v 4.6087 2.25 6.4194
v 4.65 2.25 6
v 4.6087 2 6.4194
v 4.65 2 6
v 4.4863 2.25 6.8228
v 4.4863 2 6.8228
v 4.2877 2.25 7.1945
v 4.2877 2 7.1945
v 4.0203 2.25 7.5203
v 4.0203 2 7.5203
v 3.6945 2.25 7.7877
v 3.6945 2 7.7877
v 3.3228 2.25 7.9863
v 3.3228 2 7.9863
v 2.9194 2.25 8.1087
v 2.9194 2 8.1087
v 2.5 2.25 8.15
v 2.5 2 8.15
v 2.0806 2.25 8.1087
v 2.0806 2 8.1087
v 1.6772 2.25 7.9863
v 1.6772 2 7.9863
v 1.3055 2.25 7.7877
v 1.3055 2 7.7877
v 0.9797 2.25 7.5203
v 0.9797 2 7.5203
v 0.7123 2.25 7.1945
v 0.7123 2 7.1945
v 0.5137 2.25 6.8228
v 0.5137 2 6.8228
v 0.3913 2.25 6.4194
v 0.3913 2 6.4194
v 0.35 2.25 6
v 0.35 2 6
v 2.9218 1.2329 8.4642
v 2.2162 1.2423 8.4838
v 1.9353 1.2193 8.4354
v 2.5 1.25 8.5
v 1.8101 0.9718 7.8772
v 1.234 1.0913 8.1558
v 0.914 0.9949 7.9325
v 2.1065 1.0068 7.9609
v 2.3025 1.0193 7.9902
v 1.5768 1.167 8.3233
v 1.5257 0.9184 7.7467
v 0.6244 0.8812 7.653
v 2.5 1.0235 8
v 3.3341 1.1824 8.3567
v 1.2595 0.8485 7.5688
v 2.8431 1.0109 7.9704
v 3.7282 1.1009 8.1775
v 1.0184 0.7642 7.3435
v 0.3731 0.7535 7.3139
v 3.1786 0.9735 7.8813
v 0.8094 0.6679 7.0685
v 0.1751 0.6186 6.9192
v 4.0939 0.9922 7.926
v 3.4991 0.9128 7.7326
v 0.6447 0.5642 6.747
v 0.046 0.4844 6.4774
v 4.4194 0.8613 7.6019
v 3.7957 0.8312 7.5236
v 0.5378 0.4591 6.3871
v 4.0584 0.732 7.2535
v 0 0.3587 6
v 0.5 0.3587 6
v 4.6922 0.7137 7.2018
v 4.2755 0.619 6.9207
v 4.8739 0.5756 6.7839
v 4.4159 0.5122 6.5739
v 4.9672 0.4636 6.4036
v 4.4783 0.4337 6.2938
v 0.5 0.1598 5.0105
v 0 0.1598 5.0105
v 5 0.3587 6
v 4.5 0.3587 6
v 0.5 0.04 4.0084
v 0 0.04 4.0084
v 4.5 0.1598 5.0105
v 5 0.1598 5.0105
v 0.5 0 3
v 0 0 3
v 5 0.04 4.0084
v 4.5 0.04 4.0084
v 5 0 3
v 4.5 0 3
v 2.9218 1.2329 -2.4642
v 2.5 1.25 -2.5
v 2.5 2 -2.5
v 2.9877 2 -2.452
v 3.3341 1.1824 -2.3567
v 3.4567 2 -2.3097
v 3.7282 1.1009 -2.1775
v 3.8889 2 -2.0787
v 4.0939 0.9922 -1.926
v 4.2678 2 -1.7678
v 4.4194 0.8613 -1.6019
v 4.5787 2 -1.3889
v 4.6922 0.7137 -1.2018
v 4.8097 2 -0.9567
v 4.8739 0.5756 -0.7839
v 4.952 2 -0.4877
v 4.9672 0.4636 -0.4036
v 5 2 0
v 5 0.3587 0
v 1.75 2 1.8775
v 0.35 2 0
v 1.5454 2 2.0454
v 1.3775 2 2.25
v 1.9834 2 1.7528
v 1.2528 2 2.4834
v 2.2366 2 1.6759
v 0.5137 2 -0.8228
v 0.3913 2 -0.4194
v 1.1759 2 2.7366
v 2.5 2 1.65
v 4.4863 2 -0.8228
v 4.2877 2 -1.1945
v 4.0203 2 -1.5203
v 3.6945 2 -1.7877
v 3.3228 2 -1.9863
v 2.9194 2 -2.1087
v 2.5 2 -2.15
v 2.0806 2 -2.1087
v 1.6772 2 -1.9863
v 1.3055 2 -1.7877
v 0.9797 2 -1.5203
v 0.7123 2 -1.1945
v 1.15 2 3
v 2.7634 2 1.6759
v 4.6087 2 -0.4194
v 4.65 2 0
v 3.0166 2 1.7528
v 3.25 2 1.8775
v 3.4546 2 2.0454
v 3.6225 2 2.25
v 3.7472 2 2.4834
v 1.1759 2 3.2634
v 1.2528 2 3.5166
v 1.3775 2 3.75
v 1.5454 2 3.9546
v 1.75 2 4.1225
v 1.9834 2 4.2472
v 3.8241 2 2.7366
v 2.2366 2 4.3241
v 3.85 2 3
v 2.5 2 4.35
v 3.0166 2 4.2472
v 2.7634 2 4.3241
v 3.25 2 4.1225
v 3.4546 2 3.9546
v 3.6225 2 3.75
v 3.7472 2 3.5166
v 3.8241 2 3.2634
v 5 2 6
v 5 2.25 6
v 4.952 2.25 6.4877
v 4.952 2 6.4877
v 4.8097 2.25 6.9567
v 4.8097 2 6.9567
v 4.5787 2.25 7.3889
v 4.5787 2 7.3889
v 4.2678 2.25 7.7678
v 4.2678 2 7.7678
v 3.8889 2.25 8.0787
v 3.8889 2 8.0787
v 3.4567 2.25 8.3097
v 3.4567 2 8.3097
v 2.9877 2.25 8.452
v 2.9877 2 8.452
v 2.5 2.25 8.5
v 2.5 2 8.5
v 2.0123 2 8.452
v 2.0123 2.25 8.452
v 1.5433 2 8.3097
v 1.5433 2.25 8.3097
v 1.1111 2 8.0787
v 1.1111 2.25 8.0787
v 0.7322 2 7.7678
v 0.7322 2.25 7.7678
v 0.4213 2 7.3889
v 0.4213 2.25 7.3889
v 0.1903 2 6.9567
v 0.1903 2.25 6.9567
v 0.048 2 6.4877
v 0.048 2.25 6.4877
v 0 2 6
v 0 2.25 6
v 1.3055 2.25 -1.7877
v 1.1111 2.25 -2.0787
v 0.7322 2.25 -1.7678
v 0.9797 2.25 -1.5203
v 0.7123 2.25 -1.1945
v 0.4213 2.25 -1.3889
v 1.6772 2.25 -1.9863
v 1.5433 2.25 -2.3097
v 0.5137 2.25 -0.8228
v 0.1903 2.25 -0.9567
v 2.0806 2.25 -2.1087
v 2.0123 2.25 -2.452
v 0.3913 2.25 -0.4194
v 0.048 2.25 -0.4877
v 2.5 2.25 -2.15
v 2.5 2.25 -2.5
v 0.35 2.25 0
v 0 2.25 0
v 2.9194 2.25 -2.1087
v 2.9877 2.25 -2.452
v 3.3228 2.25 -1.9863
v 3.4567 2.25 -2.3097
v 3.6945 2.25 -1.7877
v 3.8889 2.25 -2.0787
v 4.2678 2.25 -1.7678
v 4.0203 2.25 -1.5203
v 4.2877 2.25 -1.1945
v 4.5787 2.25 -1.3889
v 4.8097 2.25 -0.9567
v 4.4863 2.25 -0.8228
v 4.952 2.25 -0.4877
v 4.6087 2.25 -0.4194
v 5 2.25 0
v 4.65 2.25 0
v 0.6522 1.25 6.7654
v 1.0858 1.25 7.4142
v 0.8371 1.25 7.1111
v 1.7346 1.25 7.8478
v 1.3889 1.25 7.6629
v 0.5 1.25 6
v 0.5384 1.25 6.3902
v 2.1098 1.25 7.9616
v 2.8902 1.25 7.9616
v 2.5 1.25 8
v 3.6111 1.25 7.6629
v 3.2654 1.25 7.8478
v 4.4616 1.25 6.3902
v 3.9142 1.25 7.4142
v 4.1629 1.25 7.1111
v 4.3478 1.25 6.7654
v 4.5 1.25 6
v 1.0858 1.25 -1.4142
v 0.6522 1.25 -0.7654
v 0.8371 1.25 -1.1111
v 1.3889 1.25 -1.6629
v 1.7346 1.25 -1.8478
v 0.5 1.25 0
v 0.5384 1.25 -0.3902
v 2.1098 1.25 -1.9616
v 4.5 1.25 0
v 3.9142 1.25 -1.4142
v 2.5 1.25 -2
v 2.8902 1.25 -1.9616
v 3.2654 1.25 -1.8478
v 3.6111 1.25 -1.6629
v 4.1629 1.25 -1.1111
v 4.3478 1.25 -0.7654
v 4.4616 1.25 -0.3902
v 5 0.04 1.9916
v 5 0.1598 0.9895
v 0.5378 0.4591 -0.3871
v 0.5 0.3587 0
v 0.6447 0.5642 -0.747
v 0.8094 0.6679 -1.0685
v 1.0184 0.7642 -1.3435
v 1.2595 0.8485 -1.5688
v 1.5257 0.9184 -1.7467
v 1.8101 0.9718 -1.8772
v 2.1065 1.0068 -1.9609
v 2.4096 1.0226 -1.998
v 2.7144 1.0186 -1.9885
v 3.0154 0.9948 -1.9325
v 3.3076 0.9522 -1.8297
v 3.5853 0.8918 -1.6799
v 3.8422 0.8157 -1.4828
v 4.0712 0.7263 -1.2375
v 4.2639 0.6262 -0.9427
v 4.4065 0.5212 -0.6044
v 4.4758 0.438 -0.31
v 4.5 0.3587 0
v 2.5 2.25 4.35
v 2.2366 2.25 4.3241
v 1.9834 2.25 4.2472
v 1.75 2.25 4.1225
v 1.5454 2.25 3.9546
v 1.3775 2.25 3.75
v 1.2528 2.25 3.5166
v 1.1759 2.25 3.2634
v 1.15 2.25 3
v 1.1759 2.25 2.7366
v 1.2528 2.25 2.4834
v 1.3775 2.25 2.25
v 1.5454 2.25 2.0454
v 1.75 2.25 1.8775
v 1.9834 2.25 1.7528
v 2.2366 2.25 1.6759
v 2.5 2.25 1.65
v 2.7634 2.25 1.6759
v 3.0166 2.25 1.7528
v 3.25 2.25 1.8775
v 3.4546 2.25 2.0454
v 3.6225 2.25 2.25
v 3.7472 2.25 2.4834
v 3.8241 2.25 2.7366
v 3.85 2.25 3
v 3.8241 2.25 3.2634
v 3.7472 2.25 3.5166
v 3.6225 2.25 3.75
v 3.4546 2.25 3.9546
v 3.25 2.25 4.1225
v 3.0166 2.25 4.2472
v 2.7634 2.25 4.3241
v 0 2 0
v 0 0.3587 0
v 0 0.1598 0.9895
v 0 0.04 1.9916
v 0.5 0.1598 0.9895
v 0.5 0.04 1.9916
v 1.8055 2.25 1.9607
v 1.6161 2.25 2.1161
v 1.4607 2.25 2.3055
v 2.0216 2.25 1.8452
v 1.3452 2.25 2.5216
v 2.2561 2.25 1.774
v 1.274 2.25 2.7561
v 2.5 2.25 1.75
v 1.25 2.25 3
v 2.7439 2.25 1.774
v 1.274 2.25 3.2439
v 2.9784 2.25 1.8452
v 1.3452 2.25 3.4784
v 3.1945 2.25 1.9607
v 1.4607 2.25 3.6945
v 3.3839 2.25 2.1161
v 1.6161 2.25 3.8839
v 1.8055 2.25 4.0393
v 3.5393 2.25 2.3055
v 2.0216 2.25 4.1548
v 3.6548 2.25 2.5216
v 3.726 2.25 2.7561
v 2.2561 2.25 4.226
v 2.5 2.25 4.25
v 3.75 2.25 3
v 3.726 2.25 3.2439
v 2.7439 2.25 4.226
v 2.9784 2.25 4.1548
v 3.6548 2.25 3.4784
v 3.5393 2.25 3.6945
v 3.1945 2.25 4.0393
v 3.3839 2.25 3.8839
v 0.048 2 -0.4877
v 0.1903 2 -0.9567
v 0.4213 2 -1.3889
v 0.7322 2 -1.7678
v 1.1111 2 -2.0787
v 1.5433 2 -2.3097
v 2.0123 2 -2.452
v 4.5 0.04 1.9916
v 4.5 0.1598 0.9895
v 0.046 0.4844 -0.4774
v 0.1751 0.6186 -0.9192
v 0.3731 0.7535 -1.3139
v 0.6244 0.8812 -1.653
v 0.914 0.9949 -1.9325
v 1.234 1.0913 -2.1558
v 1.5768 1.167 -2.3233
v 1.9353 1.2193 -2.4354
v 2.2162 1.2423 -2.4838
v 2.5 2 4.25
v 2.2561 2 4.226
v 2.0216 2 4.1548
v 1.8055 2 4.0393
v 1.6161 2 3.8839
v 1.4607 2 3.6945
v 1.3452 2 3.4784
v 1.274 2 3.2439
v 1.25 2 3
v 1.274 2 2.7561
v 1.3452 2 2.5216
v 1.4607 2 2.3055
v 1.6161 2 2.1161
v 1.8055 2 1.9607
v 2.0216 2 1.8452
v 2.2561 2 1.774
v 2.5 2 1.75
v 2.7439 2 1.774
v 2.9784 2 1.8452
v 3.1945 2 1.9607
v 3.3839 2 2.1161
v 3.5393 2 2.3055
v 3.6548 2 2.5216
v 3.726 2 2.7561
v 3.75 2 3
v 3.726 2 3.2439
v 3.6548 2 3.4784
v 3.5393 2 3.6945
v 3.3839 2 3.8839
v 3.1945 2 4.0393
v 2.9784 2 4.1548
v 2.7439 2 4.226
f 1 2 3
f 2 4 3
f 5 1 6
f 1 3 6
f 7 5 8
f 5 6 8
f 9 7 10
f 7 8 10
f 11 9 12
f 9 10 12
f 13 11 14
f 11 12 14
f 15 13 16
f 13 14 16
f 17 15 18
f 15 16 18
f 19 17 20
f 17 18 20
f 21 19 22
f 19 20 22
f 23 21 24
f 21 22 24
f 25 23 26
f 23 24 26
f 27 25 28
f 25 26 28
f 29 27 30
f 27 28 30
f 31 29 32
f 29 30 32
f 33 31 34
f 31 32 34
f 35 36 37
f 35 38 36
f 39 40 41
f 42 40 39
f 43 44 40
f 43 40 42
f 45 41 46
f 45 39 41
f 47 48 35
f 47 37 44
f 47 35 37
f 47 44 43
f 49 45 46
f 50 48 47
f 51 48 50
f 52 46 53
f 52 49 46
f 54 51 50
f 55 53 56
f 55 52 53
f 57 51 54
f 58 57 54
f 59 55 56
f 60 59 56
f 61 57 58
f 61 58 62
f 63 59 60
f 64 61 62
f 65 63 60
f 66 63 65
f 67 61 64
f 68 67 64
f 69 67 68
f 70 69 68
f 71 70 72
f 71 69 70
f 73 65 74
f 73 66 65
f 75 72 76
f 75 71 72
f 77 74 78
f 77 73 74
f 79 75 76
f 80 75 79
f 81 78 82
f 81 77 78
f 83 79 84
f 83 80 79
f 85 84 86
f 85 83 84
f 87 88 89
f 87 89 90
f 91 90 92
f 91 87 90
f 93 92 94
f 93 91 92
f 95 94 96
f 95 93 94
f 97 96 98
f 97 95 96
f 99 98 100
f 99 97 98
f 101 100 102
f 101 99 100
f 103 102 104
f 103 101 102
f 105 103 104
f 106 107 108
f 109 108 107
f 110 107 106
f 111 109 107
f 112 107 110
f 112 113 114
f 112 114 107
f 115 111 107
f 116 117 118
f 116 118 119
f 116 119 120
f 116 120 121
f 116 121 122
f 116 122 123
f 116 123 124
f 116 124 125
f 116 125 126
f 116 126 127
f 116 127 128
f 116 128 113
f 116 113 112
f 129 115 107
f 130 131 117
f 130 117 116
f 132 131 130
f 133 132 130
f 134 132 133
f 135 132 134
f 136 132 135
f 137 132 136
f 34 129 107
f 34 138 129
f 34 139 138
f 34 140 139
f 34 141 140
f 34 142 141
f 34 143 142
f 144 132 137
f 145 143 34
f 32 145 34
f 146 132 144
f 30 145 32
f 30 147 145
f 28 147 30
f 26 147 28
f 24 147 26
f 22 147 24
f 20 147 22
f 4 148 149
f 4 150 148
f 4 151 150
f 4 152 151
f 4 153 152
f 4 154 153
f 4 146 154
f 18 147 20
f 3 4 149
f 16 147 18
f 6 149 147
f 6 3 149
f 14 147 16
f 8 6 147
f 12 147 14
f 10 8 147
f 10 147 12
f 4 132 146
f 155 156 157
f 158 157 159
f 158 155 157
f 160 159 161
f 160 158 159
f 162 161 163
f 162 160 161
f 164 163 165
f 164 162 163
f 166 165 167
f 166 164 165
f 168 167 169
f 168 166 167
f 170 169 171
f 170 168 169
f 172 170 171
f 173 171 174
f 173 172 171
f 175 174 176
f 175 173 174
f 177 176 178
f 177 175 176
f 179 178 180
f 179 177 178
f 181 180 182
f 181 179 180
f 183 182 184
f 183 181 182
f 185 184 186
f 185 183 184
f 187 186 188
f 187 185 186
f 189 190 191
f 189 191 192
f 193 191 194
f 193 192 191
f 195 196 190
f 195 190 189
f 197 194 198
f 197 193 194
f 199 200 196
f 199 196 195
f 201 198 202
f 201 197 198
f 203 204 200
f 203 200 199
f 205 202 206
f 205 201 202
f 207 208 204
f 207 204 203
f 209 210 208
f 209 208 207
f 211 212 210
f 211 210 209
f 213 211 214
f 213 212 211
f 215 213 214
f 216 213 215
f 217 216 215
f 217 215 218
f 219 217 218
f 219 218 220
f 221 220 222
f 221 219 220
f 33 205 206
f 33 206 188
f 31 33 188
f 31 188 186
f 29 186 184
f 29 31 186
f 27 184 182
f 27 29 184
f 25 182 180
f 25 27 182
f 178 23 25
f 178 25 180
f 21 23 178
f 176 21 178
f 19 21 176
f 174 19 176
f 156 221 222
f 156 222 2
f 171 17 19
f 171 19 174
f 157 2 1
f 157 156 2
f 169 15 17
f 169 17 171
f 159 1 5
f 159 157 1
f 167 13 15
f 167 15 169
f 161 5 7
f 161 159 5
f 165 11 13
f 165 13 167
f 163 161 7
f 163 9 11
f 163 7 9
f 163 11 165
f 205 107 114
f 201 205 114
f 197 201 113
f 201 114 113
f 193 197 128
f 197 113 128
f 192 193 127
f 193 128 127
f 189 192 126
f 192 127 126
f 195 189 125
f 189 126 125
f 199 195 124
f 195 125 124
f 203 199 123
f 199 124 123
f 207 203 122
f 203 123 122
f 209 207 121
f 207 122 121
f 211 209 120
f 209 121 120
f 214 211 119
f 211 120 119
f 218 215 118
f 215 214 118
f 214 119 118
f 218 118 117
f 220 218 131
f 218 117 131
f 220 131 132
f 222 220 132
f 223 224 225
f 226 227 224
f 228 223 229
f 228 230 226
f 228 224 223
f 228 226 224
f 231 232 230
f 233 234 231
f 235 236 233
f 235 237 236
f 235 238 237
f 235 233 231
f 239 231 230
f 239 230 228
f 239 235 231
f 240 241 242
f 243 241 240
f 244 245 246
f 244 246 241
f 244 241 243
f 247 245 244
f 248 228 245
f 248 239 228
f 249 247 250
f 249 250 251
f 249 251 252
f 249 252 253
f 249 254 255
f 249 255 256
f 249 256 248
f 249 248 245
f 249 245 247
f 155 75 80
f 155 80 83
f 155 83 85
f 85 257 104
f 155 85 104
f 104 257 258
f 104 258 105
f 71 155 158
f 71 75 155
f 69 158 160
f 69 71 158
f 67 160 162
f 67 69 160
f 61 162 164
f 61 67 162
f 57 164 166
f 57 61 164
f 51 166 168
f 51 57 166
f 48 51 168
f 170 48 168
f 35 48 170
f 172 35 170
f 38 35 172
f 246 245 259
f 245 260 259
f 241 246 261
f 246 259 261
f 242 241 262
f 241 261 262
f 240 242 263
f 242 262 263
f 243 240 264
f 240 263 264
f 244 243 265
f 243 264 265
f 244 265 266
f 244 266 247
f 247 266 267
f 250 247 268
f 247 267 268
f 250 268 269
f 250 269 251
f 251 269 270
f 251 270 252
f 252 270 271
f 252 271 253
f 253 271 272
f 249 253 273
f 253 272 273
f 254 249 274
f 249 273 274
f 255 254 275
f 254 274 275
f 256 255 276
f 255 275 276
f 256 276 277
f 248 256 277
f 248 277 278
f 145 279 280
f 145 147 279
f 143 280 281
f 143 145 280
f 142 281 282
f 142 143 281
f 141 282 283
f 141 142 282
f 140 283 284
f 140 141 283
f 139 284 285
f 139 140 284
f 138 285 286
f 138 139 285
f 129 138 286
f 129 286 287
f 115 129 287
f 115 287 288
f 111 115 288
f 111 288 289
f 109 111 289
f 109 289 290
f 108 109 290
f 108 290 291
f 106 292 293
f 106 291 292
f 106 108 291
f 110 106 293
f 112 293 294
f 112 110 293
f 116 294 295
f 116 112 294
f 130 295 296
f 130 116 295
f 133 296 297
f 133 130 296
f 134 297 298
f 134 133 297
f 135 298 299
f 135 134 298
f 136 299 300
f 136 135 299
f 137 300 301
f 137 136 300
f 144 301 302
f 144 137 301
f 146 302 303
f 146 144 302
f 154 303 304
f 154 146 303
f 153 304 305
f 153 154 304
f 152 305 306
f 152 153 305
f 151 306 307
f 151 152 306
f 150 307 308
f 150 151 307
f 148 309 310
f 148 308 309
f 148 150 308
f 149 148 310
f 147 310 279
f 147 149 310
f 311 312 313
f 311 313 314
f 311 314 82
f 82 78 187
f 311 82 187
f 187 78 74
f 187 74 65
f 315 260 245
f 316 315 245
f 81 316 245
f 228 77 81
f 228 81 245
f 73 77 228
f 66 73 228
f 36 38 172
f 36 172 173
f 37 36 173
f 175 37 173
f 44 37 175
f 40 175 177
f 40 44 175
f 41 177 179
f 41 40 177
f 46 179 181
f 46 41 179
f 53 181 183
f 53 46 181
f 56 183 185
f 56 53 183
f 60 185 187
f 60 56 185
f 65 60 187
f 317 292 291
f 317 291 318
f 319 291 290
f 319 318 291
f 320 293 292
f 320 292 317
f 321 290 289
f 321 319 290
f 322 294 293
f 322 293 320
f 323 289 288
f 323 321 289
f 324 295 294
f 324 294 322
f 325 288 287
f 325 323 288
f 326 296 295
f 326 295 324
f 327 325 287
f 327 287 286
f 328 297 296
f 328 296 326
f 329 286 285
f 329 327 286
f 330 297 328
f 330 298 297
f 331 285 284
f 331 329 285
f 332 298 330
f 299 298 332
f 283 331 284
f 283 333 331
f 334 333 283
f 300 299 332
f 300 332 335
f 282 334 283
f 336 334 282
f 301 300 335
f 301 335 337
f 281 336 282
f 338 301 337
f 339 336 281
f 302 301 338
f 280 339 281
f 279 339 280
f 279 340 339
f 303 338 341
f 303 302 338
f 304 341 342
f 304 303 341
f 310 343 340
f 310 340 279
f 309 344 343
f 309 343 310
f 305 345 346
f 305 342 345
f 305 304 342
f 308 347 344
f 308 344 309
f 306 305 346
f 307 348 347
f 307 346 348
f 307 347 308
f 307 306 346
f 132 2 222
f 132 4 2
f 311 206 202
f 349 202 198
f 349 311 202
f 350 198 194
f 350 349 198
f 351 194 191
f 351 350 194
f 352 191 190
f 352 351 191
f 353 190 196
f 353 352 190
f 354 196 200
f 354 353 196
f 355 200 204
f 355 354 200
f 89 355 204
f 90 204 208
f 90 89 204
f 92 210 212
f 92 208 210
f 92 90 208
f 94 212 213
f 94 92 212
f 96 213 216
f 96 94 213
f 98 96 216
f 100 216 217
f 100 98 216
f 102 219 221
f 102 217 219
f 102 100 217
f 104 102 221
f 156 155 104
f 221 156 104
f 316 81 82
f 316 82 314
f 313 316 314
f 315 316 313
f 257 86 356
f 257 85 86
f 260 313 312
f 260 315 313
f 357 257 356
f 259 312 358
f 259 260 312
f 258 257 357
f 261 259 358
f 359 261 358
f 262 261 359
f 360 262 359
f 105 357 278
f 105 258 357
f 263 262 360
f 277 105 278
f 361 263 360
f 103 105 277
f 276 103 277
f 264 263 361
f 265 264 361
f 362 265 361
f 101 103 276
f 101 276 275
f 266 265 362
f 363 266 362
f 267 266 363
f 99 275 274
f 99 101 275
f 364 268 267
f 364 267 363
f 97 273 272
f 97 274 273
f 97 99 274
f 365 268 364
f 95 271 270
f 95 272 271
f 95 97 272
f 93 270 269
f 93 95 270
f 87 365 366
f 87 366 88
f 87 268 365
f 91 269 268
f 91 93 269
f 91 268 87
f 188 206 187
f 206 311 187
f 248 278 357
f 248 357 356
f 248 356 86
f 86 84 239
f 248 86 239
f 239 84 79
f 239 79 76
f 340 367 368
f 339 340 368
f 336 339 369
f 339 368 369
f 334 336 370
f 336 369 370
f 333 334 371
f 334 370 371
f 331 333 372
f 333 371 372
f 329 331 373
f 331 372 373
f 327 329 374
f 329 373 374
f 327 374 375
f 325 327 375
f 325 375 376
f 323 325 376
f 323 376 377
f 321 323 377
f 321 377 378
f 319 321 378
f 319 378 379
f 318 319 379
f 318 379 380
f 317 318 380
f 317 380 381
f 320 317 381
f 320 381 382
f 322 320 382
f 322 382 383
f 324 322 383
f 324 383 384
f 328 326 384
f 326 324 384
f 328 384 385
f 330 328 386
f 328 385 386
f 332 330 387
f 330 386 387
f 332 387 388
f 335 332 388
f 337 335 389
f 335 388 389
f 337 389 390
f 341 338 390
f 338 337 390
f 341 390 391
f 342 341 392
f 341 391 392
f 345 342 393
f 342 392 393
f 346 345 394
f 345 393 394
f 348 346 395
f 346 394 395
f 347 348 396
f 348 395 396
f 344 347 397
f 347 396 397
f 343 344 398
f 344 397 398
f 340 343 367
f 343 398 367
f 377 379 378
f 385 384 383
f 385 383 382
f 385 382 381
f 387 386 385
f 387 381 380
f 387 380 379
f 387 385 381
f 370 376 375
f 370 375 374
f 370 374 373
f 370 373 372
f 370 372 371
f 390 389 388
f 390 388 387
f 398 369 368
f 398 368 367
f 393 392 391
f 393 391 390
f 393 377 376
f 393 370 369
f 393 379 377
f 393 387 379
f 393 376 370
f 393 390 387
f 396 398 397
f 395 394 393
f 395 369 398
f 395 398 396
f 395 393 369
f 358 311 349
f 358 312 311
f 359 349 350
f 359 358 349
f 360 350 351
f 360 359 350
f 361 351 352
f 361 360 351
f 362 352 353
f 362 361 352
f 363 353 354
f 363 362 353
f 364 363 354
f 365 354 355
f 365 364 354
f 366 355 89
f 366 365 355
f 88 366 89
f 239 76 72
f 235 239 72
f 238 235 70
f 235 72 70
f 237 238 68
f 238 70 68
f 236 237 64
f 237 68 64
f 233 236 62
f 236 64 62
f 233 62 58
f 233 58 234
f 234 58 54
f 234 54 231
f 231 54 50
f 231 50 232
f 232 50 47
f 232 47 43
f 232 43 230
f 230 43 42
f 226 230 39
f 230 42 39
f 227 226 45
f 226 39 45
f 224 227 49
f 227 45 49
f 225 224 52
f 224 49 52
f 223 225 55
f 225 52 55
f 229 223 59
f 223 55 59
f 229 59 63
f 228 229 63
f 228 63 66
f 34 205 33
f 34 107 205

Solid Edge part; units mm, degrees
sketch "Sketch1" plane through (0, 0, 0) normal (0, -1, 0) x (1, 0, 0)
  line L0 (0, 0) -> (0, 6)
  arc A0 (0, 6) -> (5, 6) centre (2.5, 6) cw
  line L1 (5, 6) -> (5, 0)
  arc A1 (0, 0) -> (5, 0) centre (2.5, 0) ccw
extrude "Protrusion1" add sketch "Sketch1" against normal blind 2
sketch "Sketch2" plane through (5, 1, 3) normal (1, 0, 0) x (0, 1, 0)
  line L0 (1, 5.5) -> (0.25, 5.5)
  arc A0 (0.25, 5.5) -> (0.25, -5.5) centre (11.725, 0) ccw
  line L1 (1, -5.5) -> (0.25, -5.5)
  line L2 (1, 5.5) -> (1, -5.5)
extrude "ExtrudedCutout_1" cut sketch "Sketch2" against normal blind 43.2268 flip side to cut
sketch "Sketch3" plane through (2.5, 0, 3) normal (0, -1, 0) x (0, 0, 1)
  arc A0 (-3, 2) -> (-3, -2) centre (-3, 0) ccw
  line L0 (-3, -2) -> (3, -2)
  arc A1 (3, 2) -> (3, -2) centre (3, 0) cw
  line L1 (-3, 2) -> (3, 2)
extrude "ExtrudedCutout_2" cut sketch "Sketch3" against normal blind 1.25
sketch "Sketch4" plane through (2.5, 2, 3) normal (0, 1, 0) x (0, 0, 1)
  circle A0 centre (0, 0) radius 1.25
  circle A1 centre (0, 0) radius 1.35
extrude "ExtrudedProtrusion_2" add sketch "Sketch4" along normal blind 0.25
sketch "Sketch5" plane through (2.5, 2, 3) normal (0, 1, 0) x (0, 0, 1)
  arc A0 (-3, 2.15) -> (-3, -2.15) centre (-3, 0) ccw
  line L0 (-3, -2.15) -> (3, -2.15)
  arc A1 (3, -2.15) -> (3, 2.15) centre (3, 0) ccw
  line L1 (3, 2.15) -> (-3, 2.15)
  arc A2 (-3, 2.5) -> (-3, -2.5) centre (-3, 0) ccw
  line L2 (-3, -2.5) -> (3, -2.5)
  arc A3 (3, -2.5) -> (3, 2.5) centre (3, 0) ccw
  line L3 (3, 2.5) -> (-3, 2.5)
  dimension "D1" = 0.35
  dimension "D2" = 0.35
extrude "ExtrudedProtrusion_4" add sketch "Sketch5" along normal blind 0.25
properties material "Stainless Steel, 420"
